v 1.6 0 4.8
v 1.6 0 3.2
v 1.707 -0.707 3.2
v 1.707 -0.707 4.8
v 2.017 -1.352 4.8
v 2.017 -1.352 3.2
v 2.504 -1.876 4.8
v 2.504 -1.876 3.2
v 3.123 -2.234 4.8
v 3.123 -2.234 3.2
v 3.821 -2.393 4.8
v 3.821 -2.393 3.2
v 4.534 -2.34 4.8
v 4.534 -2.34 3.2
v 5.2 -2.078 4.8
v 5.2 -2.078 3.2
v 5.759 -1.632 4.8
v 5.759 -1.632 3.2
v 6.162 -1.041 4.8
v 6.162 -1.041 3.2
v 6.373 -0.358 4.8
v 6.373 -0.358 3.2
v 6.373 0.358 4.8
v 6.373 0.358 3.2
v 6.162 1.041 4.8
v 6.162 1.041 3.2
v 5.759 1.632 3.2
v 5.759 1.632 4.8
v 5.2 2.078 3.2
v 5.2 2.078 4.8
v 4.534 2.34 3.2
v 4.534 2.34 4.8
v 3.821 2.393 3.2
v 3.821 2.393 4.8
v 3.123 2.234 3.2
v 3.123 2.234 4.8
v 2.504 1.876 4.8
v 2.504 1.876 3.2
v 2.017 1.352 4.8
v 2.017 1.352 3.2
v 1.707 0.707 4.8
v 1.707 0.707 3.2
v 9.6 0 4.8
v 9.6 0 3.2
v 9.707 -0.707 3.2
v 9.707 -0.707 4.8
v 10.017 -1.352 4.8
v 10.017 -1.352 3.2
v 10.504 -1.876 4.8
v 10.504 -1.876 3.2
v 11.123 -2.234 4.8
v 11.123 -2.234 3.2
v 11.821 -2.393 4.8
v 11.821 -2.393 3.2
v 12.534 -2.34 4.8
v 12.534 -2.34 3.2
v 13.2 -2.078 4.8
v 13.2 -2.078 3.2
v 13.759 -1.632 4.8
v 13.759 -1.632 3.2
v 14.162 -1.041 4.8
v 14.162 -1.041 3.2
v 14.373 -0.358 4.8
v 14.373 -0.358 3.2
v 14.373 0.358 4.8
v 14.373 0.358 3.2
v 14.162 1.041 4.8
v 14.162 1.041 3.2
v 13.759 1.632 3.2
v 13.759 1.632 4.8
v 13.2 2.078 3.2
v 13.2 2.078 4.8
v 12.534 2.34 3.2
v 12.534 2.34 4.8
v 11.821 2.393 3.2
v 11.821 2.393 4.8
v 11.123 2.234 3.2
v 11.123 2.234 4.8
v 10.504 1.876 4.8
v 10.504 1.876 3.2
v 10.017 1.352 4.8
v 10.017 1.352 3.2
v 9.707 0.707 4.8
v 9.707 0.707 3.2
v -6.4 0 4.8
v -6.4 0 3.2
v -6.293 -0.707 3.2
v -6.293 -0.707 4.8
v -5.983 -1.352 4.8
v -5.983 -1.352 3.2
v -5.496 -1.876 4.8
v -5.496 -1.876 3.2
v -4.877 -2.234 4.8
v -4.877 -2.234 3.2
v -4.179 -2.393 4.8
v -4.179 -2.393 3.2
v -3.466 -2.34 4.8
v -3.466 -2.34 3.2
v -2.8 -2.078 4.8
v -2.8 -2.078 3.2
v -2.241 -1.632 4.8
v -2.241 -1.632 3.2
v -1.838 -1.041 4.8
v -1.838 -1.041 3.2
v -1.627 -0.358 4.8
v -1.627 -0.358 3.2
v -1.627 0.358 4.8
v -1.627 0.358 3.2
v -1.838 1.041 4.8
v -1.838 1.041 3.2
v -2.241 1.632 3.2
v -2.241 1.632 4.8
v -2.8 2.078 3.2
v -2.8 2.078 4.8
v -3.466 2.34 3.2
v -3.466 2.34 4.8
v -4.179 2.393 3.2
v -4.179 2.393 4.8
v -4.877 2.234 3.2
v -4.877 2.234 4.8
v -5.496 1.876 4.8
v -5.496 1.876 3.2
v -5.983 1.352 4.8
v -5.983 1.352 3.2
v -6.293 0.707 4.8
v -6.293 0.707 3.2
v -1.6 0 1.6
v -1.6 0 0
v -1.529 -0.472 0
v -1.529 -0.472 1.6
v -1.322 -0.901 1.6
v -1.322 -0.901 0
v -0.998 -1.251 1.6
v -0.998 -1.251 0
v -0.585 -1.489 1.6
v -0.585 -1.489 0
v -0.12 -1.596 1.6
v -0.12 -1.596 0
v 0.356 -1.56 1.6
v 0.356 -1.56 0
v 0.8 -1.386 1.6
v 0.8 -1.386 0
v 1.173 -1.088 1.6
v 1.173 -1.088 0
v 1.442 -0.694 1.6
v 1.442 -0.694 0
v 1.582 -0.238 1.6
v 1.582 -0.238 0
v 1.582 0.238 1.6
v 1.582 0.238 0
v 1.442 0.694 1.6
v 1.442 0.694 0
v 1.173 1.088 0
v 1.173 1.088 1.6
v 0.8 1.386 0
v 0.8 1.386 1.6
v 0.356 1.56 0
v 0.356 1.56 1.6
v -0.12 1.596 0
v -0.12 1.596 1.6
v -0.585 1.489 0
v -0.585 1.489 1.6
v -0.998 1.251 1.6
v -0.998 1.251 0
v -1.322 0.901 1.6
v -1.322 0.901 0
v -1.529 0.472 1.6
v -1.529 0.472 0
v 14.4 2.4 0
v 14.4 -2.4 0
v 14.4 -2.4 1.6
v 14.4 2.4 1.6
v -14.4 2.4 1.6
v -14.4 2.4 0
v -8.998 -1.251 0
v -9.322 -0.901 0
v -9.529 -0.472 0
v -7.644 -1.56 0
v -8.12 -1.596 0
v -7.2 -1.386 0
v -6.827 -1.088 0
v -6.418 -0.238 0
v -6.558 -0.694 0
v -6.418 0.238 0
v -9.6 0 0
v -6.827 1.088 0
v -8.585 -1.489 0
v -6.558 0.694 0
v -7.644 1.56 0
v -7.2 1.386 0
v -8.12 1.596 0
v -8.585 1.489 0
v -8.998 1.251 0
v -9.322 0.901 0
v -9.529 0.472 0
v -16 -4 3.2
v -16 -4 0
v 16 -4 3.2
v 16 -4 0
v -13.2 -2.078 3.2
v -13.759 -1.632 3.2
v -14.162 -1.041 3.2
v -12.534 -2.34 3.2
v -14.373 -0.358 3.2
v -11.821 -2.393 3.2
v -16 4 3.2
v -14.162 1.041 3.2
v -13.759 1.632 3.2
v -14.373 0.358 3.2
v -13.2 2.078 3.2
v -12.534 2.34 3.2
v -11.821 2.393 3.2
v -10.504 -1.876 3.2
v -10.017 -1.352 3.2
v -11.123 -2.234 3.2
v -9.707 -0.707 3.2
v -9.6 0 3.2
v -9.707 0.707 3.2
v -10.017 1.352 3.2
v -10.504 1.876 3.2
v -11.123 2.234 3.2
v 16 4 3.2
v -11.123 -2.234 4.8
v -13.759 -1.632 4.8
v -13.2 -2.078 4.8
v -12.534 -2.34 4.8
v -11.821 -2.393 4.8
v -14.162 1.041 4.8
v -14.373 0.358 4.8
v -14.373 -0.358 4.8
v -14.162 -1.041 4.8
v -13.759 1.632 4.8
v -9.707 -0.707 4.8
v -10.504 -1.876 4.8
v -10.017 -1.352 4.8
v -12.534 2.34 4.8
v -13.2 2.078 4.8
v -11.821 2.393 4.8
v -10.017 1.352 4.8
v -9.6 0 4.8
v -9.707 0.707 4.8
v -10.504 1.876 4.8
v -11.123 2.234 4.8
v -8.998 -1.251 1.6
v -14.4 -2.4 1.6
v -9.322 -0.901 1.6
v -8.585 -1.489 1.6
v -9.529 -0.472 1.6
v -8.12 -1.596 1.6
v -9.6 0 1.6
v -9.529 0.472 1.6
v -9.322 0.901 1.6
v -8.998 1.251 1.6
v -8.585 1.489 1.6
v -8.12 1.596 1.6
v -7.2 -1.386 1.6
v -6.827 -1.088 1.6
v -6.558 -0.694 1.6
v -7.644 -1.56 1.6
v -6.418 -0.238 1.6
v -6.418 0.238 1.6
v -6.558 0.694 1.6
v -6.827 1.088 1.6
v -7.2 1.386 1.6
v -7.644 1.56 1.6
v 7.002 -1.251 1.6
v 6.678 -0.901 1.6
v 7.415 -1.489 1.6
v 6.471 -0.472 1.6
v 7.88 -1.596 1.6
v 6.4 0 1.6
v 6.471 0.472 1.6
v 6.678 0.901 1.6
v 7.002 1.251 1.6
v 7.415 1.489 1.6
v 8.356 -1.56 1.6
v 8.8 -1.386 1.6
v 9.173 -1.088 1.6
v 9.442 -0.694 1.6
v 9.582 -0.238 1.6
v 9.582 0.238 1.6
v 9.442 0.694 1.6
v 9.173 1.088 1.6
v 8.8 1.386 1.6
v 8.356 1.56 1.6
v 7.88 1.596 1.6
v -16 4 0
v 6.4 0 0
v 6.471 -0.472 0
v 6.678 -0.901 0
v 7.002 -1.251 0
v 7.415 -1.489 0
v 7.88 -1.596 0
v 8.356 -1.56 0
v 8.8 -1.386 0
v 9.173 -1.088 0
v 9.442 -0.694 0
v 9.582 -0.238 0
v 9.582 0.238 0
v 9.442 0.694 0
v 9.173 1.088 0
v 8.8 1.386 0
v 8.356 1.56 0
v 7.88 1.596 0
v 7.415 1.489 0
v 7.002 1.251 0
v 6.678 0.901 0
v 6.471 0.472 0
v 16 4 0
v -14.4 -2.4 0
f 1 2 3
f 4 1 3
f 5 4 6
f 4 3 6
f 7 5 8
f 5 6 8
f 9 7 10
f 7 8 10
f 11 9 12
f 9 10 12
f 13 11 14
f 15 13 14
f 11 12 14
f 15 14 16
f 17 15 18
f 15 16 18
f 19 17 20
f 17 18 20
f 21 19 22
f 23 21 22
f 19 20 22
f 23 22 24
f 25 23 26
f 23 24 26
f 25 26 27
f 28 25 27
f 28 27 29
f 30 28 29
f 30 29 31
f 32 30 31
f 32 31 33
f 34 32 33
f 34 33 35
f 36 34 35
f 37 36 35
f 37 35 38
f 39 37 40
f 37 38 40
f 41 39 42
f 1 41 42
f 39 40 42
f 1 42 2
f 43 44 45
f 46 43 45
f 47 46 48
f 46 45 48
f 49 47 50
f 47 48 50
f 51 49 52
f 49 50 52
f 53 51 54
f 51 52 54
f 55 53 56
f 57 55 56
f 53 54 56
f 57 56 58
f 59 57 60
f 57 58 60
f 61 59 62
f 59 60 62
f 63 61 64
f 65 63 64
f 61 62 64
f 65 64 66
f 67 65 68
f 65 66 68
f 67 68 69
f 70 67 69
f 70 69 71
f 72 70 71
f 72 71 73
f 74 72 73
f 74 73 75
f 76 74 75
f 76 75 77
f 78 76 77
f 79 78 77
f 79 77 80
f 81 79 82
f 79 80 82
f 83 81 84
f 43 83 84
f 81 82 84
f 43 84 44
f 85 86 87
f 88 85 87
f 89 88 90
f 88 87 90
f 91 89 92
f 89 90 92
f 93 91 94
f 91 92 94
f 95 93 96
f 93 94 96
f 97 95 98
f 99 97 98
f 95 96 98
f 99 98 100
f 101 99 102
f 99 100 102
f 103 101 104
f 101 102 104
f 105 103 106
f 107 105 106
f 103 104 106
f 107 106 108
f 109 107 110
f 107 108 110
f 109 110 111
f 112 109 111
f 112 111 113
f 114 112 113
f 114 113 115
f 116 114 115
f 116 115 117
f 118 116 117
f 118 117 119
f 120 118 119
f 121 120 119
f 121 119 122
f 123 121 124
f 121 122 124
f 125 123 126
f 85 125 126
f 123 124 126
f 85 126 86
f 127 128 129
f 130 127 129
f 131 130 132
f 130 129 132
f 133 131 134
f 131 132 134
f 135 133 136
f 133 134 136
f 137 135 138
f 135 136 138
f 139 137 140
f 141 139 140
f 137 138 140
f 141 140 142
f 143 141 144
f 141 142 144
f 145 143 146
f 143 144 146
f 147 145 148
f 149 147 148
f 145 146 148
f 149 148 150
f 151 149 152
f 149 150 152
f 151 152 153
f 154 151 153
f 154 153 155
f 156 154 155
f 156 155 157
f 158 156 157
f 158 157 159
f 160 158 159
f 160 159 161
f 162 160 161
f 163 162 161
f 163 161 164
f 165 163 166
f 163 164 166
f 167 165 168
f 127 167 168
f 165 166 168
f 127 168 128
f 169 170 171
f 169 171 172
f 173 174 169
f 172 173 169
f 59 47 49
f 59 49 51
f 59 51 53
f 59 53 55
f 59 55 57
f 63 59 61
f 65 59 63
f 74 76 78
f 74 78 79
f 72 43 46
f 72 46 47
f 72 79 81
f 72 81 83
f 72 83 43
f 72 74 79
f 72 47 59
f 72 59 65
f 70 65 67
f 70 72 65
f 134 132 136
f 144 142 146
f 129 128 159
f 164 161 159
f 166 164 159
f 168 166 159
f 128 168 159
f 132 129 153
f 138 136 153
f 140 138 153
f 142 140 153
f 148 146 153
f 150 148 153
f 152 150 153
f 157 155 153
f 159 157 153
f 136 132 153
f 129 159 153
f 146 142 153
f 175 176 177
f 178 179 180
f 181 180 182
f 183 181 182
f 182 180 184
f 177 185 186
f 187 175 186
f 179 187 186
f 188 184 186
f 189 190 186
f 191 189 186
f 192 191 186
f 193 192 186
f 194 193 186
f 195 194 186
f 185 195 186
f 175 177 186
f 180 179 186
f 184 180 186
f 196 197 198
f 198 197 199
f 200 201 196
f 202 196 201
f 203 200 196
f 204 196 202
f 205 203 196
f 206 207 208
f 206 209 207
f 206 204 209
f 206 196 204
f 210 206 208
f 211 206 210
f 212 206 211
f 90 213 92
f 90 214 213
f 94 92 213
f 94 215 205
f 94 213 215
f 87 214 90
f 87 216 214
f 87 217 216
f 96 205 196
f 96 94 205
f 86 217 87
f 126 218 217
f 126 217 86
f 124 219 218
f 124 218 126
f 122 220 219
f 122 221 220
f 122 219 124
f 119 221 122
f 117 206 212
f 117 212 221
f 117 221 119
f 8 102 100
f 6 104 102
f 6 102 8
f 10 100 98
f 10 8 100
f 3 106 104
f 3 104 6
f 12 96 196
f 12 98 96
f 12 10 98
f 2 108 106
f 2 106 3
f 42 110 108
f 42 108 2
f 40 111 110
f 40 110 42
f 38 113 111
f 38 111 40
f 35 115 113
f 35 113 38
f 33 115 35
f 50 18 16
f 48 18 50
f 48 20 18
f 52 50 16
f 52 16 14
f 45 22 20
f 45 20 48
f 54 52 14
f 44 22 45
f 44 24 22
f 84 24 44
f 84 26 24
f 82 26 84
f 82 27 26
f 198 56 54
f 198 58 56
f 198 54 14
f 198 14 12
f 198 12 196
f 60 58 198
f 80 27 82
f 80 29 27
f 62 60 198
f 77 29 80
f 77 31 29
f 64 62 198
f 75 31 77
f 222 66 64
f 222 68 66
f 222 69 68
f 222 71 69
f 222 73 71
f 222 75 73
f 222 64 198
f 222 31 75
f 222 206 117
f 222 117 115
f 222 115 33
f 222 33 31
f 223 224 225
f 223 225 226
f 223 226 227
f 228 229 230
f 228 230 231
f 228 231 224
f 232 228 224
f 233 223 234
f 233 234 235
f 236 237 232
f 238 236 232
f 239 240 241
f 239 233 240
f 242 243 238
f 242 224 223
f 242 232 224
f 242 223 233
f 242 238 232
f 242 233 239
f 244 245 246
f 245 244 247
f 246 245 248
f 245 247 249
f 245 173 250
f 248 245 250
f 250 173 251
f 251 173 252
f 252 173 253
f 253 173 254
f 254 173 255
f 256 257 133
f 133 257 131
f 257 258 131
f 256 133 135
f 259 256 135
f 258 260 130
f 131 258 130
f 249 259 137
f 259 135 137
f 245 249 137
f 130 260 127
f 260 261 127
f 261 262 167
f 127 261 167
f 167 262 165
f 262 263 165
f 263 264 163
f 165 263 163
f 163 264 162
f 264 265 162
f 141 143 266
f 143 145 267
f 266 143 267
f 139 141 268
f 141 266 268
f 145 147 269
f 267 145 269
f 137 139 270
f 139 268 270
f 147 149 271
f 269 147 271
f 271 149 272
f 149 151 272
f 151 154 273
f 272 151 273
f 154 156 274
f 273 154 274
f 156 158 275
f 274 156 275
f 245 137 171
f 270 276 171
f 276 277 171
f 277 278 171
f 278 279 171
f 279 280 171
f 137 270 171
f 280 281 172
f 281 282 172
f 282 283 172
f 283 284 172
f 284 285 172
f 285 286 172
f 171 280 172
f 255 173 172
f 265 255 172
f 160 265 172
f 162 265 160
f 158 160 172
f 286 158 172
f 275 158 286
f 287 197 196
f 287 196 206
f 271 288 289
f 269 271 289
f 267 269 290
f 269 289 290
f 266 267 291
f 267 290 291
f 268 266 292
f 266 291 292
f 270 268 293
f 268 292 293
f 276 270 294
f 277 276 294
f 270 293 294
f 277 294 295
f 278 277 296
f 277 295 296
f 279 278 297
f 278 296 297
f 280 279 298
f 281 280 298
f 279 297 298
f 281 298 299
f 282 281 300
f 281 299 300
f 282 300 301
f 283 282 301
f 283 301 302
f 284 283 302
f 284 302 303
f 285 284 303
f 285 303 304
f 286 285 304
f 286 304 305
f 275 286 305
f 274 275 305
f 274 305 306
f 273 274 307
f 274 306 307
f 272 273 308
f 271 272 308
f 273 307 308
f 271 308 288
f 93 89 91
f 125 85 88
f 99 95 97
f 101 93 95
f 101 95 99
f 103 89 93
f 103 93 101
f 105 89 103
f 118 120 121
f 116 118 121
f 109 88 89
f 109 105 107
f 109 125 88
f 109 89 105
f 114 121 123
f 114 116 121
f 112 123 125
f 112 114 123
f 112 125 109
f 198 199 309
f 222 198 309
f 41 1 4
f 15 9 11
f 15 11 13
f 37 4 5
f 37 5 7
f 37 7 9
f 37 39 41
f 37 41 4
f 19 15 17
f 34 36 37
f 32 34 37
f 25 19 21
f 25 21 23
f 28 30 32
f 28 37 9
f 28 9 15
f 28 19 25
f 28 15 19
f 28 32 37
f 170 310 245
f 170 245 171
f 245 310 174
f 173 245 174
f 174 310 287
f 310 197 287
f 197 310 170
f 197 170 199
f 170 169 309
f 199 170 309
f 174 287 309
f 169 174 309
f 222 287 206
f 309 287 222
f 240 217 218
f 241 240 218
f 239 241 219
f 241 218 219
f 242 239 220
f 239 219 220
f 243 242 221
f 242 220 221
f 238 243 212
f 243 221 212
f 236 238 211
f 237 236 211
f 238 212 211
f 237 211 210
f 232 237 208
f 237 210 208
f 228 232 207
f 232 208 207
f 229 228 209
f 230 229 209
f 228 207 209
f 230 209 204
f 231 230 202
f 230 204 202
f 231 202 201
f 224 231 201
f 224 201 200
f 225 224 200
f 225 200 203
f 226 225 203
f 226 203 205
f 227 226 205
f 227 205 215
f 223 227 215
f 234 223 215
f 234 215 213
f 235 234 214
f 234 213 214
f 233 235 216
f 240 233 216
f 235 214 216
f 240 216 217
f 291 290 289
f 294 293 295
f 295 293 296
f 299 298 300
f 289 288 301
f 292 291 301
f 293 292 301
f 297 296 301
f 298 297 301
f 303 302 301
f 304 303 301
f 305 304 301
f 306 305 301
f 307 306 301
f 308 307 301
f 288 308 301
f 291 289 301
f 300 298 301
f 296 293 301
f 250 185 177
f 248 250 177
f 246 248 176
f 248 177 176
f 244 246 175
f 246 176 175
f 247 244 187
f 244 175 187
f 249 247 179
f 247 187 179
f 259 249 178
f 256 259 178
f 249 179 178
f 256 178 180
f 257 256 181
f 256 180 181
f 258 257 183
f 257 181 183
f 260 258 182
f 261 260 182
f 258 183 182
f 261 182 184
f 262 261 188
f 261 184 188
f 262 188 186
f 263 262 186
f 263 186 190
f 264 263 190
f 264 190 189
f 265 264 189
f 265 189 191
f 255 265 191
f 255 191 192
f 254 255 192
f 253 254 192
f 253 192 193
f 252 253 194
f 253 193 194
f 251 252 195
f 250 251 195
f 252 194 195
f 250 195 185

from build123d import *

# Parameters (mm, degrees)
F0_W     = 32
F0_H     = 8
F0_R     = 2.4
F0_R_2   = 1.6
F1_DEPTH = 3.2
F2_T     = -1.6
F3_DEPTH = 1.6
F4_START = 3.2
F4_DEPTH = 1.6


with BuildPart() as f1:
    # F0 (on Top) → F1 (new body)
    with BuildSketch(Plane.XY):
        Rectangle(F0_W, F0_H)
        with Locations((-12, 0)):
            Circle(F0_R, mode=Mode.SUBTRACT)
        with BuildLine():
            ThreePointArc((-6.4, 0), (-8, -1.6), (-9.6, 0))
            ThreePointArc((-9.6, 0), (-8, 1.6), (-6.4, 0))
        make_face(mode=Mode.SUBTRACT)
        with BuildLine():
            ThreePointArc((-1.6, 0), (-4, -2.4), (-6.4, 0))
            ThreePointArc((-6.4, 0), (-4, 2.4), (-1.6, 0))
        make_face(mode=Mode.SUBTRACT)
        with BuildLine():
            ThreePointArc((1.6, 0), (0, -1.6), (-1.6, 0))
            ThreePointArc((-1.6, 0), (0, 1.6), (1.6, 0))
        make_face(mode=Mode.SUBTRACT)
        with BuildLine():
            ThreePointArc((6.4, 0), (4, -2.4), (1.6, 0))
            ThreePointArc((1.6, 0), (4, 2.4), (6.4, 0))
        make_face(mode=Mode.SUBTRACT)
        with BuildLine():
            ThreePointArc((9.6, 0), (8, -1.6), (6.4, 0))
            ThreePointArc((6.4, 0), (8, 1.6), (9.6, 0))
        make_face(mode=Mode.SUBTRACT)
        with BuildLine():
            ThreePointArc((14.4, 0), (12, -2.4), (9.6, 0))
            ThreePointArc((9.6, 0), (12, 2.4), (14.4, 0))
        make_face(mode=Mode.SUBTRACT)
        with Locations((-12, 0)):
            Circle(F0_R)
        with Locations((-12, 0)):
            Circle(F0_R_2, mode=Mode.SUBTRACT)
        with BuildLine():
            ThreePointArc((-1.6, 0), (-4, 2.4), (-6.4, 0))
            ThreePointArc((-6.4, 0), (-4, -2.4), (-1.6, 0))
        make_face()
        with Locations((-4, 0)):
            Circle(F0_R_2, mode=Mode.SUBTRACT)
        with BuildLine():
            ThreePointArc((6.4, 0), (4, 2.4), (1.6, 0))
            ThreePointArc((1.6, 0), (4, -2.4), (6.4, 0))
        make_face()
        with Locations((4, 0)):
            Circle(F0_R_2, mode=Mode.SUBTRACT)
        with BuildLine():
            ThreePointArc((14.4, 0), (12, 2.4), (9.6, 0))
            ThreePointArc((9.6, 0), (12, -2.4), (14.4, 0))
        make_face()
        with Locations((12, 0)):
            Circle(F0_R_2, mode=Mode.SUBTRACT)
        with Locations((-12, 0)):
            Circle(F0_R_2)
        with BuildLine():
            ThreePointArc((-6.4, 0), (-8, 1.6), (-9.6, 0))
            ThreePointArc((-9.6, 0), (-8, -1.6), (-6.4, 0))
        make_face()
        with Locations((-4, 0)):
            Circle(F0_R_2)
        with BuildLine():
            ThreePointArc((1.6, 0), (0, 1.6), (-1.6, 0))
            ThreePointArc((-1.6, 0), (0, -1.6), (1.6, 0))
        make_face()
        with Locations((4, 0)):
            Circle(F0_R_2)
        with BuildLine():
            ThreePointArc((9.6, 0), (8, 1.6), (6.4, 0))
            ThreePointArc((6.4, 0), (8, -1.6), (9.6, 0))
        make_face()
        with Locations((12, 0)):
            Circle(F0_R_2)
    extrude(amount=F1_DEPTH)

    # F2
    f2_openings = [f1.faces().sort_by_distance(p)[0] for p in [
        (0, 0, 0),
    ]]
    offset(amount=F2_T, openings=f2_openings)

    # F0 (on Top) → F3 (join, through all)
    with BuildSketch(Plane.XY):
        with BuildLine():
            ThreePointArc((-6.4, 0), (-8, 1.6), (-9.6, 0))
            ThreePointArc((-9.6, 0), (-8, -1.6), (-6.4, 0))
        make_face()
        with BuildLine():
            ThreePointArc((1.6, 0), (0, 1.6), (-1.6, 0))
            ThreePointArc((-1.6, 0), (0, -1.6), (1.6, 0))
        make_face()
        with BuildLine():
            ThreePointArc((9.6, 0), (8, 1.6), (6.4, 0))
            ThreePointArc((6.4, 0), (8, -1.6), (9.6, 0))
        make_face()
    extrude(amount=F3_DEPTH)

    # F0 (on Top) → F4 (join)
    with BuildSketch(Plane.XY.offset(F4_START)):
        with Locations((-12, 0)):
            Circle(F0_R)
        with Locations((-12, 0)):
            Circle(F0_R_2, mode=Mode.SUBTRACT)
        with BuildLine():
            ThreePointArc((-1.6, 0), (-4, 2.4), (-6.4, 0))
            ThreePointArc((-6.4, 0), (-4, -2.4), (-1.6, 0))
        make_face()
        with Locations((-4, 0)):
            Circle(F0_R_2, mode=Mode.SUBTRACT)
        with BuildLine():
            ThreePointArc((6.4, 0), (4, 2.4), (1.6, 0))
            ThreePointArc((1.6, 0), (4, -2.4), (6.4, 0))
        make_face()
        with Locations((4, 0)):
            Circle(F0_R_2, mode=Mode.SUBTRACT)
        with BuildLine():
            ThreePointArc((14.4, 0), (12, 2.4), (9.6, 0))
            ThreePointArc((9.6, 0), (12, -2.4), (14.4, 0))
        make_face()
        with Locations((12, 0)):
            Circle(F0_R_2, mode=Mode.SUBTRACT)
        with Locations((-12, 0)):
            Circle(F0_R_2)
        with Locations((-4, 0)):
            Circle(F0_R_2)
        with Locations((4, 0)):
            Circle(F0_R_2)
        with Locations((12, 0)):
            Circle(F0_R_2)
    extrude(amount=F4_DEPTH)


solid = f1.part
